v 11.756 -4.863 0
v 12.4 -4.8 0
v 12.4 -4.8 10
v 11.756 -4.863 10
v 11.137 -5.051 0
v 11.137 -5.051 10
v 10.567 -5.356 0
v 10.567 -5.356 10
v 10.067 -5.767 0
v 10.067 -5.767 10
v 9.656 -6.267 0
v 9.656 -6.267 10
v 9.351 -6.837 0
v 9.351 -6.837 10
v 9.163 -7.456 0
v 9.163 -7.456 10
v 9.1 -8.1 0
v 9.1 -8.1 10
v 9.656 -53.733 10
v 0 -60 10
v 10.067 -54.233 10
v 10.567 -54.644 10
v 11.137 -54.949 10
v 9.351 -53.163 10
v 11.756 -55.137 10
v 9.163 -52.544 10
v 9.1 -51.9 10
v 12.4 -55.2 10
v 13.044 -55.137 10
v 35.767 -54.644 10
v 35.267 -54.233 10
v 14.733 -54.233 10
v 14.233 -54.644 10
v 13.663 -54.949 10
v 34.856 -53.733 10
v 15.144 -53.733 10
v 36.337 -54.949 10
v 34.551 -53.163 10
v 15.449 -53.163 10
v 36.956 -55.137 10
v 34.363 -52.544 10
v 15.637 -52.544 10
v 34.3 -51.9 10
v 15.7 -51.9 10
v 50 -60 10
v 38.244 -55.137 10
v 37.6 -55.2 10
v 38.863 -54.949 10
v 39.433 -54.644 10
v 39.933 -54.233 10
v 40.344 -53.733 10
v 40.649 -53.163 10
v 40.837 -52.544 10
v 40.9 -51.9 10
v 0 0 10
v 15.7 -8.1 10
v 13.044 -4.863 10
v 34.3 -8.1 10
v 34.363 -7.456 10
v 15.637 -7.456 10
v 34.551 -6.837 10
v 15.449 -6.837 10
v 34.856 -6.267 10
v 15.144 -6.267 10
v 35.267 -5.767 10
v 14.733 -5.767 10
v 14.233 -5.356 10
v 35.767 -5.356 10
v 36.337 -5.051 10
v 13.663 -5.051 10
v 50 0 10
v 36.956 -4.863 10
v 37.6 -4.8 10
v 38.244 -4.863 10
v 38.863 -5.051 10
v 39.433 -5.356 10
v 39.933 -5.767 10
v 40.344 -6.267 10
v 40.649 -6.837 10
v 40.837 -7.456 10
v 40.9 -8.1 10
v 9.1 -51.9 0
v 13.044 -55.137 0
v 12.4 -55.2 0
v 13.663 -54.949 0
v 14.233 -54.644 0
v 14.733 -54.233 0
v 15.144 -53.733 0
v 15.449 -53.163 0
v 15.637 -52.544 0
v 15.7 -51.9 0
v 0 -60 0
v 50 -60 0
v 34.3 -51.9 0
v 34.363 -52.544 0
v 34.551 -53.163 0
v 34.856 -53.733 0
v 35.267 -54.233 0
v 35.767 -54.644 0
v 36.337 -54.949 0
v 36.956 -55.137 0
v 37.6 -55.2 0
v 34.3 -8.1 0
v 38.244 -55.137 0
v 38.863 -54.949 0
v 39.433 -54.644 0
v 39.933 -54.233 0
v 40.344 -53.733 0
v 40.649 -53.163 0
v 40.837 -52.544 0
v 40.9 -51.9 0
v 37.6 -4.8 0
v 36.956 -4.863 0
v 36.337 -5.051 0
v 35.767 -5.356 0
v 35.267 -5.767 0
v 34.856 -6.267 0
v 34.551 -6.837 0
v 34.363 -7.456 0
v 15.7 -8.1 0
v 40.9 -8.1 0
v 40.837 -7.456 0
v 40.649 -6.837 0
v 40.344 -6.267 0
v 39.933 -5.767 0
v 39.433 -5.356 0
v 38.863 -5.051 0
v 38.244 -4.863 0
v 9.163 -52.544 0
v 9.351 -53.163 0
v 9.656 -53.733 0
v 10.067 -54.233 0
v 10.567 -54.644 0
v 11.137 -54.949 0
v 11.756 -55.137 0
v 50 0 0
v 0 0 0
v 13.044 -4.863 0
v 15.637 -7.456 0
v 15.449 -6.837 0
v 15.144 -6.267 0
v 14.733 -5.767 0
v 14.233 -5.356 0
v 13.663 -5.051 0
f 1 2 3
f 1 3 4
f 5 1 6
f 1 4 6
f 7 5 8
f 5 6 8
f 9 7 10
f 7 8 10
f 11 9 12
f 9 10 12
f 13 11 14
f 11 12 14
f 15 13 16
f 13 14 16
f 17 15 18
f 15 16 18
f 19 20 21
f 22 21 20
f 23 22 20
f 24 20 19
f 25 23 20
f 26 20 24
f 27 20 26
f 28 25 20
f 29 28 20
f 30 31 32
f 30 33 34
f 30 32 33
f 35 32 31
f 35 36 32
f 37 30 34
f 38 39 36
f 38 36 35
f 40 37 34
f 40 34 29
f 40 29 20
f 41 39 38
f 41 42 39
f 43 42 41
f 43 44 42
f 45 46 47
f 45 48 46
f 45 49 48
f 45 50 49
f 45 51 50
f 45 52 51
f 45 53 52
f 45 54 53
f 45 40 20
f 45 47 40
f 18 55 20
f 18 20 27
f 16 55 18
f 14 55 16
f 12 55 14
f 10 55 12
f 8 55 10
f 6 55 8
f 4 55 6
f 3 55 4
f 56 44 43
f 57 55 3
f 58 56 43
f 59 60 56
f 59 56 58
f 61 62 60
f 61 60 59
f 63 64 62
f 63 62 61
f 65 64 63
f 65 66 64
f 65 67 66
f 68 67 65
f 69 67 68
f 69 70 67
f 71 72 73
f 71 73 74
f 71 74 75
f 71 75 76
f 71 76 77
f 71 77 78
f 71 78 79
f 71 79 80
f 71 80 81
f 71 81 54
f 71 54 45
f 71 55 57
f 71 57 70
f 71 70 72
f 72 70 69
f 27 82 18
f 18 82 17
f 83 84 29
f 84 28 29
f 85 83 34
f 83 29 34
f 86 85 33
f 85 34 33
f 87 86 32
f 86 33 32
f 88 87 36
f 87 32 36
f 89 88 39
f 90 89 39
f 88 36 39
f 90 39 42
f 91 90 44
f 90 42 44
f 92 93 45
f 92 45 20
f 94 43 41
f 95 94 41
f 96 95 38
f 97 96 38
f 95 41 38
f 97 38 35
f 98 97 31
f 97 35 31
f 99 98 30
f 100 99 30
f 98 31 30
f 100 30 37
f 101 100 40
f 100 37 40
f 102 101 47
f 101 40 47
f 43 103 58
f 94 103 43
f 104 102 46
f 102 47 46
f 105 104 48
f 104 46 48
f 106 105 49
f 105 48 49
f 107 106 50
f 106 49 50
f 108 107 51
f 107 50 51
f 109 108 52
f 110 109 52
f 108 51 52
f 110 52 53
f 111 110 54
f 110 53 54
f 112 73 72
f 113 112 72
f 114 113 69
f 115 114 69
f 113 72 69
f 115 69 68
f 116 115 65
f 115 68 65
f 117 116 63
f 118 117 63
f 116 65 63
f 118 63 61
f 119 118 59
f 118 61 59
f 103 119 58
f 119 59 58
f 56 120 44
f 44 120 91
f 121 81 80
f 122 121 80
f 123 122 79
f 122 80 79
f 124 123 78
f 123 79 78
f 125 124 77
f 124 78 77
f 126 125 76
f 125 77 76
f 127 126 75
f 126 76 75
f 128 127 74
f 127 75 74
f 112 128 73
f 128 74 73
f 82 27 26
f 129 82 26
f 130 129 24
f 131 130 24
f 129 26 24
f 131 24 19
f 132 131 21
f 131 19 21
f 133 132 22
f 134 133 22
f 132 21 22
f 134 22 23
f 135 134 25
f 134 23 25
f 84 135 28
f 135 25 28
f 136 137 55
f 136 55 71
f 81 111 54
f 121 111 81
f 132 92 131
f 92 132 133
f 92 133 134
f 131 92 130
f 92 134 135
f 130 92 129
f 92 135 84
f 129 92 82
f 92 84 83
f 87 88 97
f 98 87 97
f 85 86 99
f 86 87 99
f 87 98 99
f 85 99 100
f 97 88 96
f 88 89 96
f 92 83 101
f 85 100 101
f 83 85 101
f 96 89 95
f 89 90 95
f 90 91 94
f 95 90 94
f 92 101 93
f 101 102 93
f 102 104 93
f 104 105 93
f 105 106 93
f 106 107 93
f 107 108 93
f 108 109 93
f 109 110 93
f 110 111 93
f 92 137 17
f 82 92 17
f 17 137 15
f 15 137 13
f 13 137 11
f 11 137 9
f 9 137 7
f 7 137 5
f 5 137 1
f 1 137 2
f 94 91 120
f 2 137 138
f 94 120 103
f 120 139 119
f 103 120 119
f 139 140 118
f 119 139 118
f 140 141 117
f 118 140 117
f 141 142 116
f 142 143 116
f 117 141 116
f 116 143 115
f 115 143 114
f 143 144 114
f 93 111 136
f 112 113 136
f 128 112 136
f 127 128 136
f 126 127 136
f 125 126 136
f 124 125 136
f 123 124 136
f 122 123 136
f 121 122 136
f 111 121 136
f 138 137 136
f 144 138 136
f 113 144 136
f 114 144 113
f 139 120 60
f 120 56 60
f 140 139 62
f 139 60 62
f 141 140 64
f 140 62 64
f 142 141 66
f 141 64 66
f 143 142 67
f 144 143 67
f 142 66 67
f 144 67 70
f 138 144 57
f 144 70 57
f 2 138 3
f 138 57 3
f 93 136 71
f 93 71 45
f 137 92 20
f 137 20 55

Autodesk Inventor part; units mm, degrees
ref_plane "YZ Plane" through (0, 0, 0) normal (1, 0, 0) x (0, 1, 0)
ref_plane "XZ Plane" through (0, 0, 0) normal (0, 1, 0) x (-1, 0, 0)
ref_plane "XY Plane" through (0, 0, 0) normal (0, 0, 1) x (1, 0, 0)
sketch "Skizze3" plane through (0, 0, 0) normal (0, 0, 1) x (1, 0, 0)
  line L0 (0, 0) -> (50, 0)
  line L1 (0, 0) -> (50, 0)
  line L2 (50, 0) -> (50, -60)
  line L3 (50, -60) -> (0, -60)
  line L4 (0, -60) -> (0, 0)
  line L5 (40.9, -4.8) -> (34.3, -4.8)
  line L6 (34.3, -4.8) -> (34.3, -55.2)
  line L7 (34.3, -55.2) -> (40.9, -55.2)
  line L8 (40.9, -55.2) -> (40.9, -4.8)
  line L9 (9.1, -4.8) -> (15.7, -4.8)
  line L10 (15.7, -4.8) -> (15.7, -55.2)
  line L11 (15.7, -55.2) -> (9.1, -55.2)
  line L12 (9.1, -55.2) -> (9.1, -4.8)
  dimension "d20" = 50
  dimension "d21" = 60
  dimension "d27" = 6.6
  dimension "d28" = 6.6
extrude "Extrusion6" add sketch "Skizze3" along normal blind 10
fillet "Rundung5" radius 3.3 8 edges at (34.3, -4.8, 5) (9.1, -4.8, 5) (40.9, -4.8, 5) (15.7, -4.8, 5) (34.3, -55.2, 5) (9.1, -55.2, 5) (40.9, -55.2, 5) (15.7, -55.2, 5)
properties part number "Fuß Steher"
